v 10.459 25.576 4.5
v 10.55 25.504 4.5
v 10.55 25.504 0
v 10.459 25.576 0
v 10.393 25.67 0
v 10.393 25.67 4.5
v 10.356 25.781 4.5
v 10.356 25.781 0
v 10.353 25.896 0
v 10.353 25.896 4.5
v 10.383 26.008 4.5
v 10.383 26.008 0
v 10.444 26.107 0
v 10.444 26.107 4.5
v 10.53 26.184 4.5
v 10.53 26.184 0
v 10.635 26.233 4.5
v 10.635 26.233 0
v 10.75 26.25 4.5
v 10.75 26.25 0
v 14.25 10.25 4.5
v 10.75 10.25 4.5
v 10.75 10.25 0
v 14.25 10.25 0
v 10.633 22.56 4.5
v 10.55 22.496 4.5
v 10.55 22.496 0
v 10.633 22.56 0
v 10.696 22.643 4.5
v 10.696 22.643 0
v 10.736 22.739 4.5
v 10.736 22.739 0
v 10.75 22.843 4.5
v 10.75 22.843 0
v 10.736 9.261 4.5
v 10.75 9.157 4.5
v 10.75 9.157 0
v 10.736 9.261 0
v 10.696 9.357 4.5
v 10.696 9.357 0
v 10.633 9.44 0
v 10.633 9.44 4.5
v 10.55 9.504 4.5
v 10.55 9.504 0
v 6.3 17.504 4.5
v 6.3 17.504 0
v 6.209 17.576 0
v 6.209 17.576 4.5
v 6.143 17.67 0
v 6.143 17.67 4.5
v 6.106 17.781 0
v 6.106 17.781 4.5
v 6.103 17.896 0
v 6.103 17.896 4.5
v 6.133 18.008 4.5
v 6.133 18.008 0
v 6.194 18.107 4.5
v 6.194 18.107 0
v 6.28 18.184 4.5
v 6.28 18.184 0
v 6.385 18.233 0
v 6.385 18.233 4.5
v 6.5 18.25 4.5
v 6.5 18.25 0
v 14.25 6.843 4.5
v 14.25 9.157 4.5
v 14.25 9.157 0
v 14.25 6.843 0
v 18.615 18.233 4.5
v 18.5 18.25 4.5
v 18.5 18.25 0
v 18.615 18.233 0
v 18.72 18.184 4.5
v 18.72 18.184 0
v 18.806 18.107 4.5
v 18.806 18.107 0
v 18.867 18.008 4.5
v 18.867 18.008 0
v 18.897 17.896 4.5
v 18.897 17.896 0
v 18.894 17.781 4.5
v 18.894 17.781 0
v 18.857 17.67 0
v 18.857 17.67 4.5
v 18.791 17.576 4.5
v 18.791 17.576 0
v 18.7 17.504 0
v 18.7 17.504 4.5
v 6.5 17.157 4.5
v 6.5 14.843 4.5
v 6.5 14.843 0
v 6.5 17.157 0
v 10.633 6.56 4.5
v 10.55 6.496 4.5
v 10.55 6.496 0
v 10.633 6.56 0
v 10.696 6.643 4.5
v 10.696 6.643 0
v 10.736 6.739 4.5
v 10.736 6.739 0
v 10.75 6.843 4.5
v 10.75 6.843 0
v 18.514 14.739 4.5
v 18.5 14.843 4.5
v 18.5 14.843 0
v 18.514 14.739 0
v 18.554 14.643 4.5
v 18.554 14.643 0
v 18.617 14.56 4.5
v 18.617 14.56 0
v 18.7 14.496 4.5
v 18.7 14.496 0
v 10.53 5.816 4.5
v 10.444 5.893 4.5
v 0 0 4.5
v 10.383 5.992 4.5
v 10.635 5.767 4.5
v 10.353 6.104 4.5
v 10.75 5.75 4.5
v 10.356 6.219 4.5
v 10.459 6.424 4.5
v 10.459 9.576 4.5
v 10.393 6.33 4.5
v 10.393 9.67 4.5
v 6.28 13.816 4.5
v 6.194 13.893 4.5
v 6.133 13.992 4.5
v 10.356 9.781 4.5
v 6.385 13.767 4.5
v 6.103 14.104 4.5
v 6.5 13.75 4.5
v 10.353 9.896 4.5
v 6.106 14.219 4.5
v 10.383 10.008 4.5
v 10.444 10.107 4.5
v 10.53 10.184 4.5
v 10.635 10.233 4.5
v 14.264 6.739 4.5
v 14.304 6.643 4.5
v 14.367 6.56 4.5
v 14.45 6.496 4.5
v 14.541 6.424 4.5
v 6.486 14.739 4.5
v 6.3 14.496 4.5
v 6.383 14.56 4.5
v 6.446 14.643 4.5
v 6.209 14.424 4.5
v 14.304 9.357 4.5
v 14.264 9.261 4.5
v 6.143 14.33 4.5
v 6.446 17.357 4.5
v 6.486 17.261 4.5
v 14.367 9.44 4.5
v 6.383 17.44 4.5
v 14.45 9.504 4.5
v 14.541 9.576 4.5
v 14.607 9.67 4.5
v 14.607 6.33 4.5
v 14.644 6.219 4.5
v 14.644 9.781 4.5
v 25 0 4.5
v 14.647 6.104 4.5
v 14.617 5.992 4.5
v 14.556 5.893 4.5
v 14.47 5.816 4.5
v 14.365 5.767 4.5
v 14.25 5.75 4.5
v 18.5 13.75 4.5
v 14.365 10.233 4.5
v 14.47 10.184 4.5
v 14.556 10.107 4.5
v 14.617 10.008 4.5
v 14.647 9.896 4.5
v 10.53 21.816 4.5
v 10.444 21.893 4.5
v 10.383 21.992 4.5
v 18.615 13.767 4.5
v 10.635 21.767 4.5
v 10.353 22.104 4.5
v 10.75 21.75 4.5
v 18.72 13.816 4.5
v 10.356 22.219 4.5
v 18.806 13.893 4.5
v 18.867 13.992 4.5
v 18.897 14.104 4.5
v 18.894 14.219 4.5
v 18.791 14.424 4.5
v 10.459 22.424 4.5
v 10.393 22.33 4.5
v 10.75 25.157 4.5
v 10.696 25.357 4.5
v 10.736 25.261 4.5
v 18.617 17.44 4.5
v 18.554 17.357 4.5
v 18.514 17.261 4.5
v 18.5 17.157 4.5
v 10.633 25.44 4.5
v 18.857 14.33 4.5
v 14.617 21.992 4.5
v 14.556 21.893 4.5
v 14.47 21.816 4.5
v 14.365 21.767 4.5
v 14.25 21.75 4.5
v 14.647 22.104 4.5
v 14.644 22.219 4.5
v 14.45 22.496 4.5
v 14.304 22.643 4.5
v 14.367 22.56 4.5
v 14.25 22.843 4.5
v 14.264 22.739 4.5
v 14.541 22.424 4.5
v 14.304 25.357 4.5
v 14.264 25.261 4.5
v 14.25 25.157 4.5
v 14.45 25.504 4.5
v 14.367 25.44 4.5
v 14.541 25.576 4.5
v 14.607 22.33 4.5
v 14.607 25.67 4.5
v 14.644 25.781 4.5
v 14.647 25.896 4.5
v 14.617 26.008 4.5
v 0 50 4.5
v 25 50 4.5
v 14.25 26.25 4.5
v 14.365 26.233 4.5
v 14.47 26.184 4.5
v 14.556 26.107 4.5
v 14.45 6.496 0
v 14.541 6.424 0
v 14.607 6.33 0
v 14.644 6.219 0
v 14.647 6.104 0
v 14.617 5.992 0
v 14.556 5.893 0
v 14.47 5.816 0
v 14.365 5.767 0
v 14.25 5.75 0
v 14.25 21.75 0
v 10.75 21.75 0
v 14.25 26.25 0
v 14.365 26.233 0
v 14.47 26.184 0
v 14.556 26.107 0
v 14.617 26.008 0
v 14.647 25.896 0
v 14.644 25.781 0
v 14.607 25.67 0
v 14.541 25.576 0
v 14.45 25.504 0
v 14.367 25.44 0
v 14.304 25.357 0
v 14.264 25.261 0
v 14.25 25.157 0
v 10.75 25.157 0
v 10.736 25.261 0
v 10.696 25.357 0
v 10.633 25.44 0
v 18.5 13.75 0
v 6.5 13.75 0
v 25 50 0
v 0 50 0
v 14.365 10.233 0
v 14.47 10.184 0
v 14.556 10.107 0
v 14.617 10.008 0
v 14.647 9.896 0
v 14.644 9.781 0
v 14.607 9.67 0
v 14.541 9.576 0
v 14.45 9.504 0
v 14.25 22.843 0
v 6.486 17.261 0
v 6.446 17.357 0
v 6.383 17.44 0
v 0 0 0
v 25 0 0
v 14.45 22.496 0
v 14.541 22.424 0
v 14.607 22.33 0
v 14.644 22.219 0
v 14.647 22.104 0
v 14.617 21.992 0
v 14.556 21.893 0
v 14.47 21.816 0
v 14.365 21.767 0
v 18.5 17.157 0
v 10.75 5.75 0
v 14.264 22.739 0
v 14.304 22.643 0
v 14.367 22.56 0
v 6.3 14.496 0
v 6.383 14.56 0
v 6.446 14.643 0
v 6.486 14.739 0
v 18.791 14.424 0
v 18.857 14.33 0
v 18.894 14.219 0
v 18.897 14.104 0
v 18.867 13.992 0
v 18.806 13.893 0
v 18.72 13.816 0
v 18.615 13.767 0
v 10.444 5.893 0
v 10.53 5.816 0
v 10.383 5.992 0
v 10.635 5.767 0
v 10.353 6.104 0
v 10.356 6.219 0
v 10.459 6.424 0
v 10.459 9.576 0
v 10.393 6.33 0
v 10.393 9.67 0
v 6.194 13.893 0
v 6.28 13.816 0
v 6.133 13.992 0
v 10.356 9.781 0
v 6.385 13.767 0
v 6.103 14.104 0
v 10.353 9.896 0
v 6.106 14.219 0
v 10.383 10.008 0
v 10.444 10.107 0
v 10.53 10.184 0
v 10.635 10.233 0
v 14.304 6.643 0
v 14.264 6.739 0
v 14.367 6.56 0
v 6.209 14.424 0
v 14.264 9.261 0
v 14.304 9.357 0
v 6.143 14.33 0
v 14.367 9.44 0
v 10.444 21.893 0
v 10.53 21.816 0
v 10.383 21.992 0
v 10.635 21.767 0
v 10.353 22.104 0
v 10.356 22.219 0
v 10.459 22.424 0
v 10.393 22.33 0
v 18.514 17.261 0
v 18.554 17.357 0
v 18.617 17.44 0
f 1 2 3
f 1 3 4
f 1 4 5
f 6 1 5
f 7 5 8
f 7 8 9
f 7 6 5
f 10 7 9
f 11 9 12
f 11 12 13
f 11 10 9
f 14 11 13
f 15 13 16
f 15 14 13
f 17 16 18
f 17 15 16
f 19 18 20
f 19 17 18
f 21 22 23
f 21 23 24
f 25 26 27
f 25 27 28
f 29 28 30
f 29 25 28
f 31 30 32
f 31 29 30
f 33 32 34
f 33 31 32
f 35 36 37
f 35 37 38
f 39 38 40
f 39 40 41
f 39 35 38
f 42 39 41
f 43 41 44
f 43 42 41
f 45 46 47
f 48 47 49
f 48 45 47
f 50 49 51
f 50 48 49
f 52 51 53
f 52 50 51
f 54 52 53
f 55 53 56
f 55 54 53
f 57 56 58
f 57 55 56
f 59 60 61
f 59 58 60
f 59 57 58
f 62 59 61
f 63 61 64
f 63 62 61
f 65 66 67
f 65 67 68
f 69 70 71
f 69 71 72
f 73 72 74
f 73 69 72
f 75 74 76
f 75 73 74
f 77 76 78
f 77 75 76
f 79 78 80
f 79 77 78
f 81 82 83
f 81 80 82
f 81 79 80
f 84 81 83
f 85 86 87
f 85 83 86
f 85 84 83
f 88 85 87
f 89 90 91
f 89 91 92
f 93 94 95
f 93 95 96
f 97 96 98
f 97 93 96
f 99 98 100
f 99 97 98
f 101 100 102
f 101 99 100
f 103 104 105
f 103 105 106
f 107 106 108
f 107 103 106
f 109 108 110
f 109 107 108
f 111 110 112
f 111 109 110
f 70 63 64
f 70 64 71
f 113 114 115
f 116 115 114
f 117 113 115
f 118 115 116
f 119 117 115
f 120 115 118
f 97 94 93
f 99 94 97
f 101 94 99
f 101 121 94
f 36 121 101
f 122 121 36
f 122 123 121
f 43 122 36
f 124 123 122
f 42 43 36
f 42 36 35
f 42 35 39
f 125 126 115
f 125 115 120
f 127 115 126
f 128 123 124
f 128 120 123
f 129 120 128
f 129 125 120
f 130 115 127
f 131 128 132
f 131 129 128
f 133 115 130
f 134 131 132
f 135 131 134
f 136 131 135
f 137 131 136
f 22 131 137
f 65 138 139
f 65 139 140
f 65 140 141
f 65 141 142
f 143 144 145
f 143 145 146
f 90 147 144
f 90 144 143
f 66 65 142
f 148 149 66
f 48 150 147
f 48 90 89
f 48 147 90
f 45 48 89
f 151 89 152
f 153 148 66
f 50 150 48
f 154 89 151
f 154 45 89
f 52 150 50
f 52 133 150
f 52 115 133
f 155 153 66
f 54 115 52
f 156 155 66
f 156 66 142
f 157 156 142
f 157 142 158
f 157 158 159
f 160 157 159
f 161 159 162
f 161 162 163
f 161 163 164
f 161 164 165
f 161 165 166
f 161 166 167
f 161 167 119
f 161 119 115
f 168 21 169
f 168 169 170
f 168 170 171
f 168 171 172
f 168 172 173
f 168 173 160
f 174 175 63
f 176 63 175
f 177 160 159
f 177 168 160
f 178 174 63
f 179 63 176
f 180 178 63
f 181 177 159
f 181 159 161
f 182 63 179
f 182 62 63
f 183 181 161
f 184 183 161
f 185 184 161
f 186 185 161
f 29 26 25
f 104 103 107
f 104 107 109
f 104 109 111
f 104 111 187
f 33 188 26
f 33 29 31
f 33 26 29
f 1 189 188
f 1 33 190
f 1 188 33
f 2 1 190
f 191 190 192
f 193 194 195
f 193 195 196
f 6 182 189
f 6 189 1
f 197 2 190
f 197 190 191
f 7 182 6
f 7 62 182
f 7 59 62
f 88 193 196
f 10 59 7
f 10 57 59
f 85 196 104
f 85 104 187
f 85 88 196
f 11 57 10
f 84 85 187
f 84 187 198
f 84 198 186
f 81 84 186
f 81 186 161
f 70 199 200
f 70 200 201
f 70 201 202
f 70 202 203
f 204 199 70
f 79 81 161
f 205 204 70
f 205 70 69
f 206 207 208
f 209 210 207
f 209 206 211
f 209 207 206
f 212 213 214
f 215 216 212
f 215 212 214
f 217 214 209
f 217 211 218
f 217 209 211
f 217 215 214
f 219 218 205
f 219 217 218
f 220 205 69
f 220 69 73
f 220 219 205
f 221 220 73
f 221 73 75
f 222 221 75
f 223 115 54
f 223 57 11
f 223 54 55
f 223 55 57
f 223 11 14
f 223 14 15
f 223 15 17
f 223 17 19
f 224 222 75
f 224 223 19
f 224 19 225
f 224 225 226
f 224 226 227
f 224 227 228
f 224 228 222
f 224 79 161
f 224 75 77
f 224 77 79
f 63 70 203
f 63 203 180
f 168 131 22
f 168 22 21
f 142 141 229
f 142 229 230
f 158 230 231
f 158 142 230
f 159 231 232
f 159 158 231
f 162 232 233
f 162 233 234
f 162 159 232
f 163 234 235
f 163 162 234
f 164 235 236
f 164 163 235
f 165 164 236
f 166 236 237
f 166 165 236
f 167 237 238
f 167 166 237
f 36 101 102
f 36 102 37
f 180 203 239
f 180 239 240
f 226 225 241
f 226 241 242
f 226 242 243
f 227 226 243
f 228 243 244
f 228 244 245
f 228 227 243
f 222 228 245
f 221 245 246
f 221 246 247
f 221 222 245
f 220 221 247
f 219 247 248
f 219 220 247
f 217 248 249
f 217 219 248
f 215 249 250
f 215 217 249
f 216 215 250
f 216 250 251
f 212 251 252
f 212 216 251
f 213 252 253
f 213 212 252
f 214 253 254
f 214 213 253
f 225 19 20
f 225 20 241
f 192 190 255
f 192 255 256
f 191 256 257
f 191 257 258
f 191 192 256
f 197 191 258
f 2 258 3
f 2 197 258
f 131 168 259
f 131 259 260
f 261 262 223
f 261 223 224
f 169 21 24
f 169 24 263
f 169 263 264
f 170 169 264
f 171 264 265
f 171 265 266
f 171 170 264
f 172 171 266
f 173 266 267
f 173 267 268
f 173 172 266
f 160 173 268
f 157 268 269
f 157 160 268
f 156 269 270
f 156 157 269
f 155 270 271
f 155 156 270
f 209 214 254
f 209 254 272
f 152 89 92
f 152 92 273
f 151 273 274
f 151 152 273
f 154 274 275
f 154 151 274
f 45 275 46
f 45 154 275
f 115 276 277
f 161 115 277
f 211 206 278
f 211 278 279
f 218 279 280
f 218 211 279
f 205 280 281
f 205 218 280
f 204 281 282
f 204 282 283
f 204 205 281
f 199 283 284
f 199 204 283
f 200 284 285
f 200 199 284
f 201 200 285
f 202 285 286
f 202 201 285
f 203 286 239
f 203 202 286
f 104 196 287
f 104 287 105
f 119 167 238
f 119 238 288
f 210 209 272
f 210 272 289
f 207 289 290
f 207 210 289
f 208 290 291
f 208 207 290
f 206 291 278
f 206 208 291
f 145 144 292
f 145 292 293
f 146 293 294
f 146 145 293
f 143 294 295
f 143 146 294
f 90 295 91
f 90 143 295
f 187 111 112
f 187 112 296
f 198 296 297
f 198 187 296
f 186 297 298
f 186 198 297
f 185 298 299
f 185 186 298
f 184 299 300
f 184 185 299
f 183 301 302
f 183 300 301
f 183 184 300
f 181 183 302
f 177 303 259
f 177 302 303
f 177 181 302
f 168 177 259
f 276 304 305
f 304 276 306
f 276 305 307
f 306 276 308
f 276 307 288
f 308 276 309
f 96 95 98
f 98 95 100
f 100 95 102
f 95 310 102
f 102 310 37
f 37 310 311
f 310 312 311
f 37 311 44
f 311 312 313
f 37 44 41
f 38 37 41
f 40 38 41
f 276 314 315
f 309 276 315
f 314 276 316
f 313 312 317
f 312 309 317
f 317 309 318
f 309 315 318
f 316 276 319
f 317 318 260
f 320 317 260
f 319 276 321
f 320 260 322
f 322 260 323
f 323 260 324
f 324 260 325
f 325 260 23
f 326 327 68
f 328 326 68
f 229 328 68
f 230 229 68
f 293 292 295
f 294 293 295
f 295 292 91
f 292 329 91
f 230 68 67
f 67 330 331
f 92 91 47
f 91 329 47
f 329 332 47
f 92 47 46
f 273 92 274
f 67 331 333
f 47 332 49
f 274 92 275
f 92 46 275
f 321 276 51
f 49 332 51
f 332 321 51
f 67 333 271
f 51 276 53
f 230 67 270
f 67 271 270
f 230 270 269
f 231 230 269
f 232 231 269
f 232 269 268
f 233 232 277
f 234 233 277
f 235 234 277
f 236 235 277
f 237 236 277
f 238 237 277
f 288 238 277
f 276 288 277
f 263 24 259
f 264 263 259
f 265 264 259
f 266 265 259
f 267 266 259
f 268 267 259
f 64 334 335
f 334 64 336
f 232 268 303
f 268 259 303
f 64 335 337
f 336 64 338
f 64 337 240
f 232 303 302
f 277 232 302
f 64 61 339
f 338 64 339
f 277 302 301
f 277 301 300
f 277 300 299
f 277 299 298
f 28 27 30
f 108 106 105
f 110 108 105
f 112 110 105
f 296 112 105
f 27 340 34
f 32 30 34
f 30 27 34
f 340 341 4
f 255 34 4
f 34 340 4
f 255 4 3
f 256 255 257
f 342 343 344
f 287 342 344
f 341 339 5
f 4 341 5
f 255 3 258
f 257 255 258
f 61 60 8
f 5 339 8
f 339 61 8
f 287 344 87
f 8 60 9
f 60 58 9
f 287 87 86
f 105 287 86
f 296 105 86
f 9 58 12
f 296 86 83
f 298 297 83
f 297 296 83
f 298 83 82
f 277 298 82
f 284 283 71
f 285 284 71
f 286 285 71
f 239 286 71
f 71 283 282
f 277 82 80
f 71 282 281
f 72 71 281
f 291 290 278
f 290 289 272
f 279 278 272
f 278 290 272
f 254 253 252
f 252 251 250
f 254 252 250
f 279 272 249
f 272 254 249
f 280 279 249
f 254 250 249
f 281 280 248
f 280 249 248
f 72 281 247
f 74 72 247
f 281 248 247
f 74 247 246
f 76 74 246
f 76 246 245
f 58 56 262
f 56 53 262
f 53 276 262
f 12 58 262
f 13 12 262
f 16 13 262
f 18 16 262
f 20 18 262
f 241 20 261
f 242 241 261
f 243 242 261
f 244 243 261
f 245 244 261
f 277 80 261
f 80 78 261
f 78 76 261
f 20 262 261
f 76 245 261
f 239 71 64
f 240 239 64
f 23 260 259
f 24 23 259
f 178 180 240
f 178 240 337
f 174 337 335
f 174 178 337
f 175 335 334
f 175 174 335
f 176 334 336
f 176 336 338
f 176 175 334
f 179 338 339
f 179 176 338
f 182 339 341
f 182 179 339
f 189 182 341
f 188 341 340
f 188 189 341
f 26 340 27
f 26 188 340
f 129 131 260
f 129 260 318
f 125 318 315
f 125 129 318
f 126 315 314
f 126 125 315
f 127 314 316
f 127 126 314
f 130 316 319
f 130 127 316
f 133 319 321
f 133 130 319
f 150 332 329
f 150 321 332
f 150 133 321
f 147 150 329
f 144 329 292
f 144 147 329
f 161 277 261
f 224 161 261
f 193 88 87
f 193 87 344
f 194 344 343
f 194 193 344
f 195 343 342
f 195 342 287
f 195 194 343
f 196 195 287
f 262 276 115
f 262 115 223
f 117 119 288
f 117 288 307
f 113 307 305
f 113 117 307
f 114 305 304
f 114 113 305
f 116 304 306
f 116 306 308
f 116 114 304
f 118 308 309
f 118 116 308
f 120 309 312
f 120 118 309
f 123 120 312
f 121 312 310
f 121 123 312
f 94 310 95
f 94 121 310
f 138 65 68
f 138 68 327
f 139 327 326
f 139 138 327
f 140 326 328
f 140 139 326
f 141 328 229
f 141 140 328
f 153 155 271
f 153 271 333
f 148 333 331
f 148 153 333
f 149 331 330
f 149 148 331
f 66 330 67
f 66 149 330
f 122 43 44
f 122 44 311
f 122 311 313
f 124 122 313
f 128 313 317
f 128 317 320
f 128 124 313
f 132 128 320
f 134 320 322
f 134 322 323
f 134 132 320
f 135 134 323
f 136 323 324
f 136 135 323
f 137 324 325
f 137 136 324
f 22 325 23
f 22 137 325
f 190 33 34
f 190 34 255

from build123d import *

# Parameters (mm, degrees)
SKETCH1_W           = 25
SKETCH1_H           = 50
BOSS_EXTRUDE1_DEPTH = 4.5
CUT_EXTRUDE1_DEPTH  = 4.5
LPATTERN1_COUNT     = 2
LPATTERN1_PITCH     = 16
CUT_EXTRUDE2_REACH  = 6.5


with BuildPart() as part:
    # Sketch1 → Boss-Extrude1 (new body)
    with BuildSketch(Plane.XY):
        with Locations((12.5, 25)):
            Rectangle(SKETCH1_W, SKETCH1_H)
    extrude(amount=BOSS_EXTRUDE1_DEPTH)

    # Sketch2 → Cut-Extrude1 (cut)
    with BuildSketch(Plane.XY.offset(4.5)):
        with BuildLine():
            Line((12.5, 10.25), (14.25, 10.25))
            ThreePointArc((14.25, 10.25), (14.636370331, 9.953527618), (14.45, 9.503589838))
            ThreePointArc((14.45, 9.503589838), (14.303589838, 9.357179677), (14.25, 9.157179677))
            Line((14.25, 9.157179677), (14.25, 8))
            Line((14.25, 8), (14.25, 6.842820323))
            ThreePointArc((14.25, 6.842820323), (14.303589838, 6.642820323), (14.45, 6.496410162))
            ThreePointArc((14.45, 6.496410162), (14.636370331, 6.046472382), (14.25, 5.75))
            Line((14.25, 5.75), (12.5, 5.75))
            Line((12.5, 5.75), (10.75, 5.75))
            ThreePointArc((10.75, 5.75), (10.363629669, 6.046472382), (10.55, 6.496410162))
            ThreePointArc((10.55, 6.496410162), (10.696410162, 6.642820323), (10.75, 6.842820323))
            Line((10.75, 6.842820323), (10.75, 8))
            Line((10.75, 8), (10.75, 9.157179677))
            ThreePointArc((10.75, 9.157179677), (10.696410162, 9.357179677), (10.55, 9.503589838))
            ThreePointArc((10.55, 9.503589838), (10.363629669, 9.953527618), (10.75, 10.25))
            Line((10.75, 10.25), (12.5, 10.25))
        make_face()
    cut_extrude1 = extrude(amount=-CUT_EXTRUDE1_DEPTH, mode=Mode.SUBTRACT)

    # LPattern1: Cut-Extrude1 ×2
    with Locations(*[(0, i * LPATTERN1_PITCH, 0) for i in range(1, LPATTERN1_COUNT)]):
        add(cut_extrude1, mode=Mode.SUBTRACT)

    # Sketch3 → Cut-Extrude2 (cut, up to next)
    with BuildSketch(Plane.XY.offset(4.5), mode=Mode.PRIVATE) as cut_extrude2_sk1:
        with BuildLine():
            Line((6.5, 18.25), (18.5, 18.25))
            ThreePointArc((18.5, 18.25), (18.886370331, 17.953527618), (18.7, 17.503589838))
            ThreePointArc((18.7, 17.503589838), (18.553589838, 17.357179677), (18.5, 17.157179677))
            Line((18.5, 17.157179677), (18.5, 14.842820323))
            ThreePointArc((18.5, 14.842820323), (18.553589838, 14.642820323), (18.7, 14.496410162))
            ThreePointArc((18.7, 14.496410162), (18.886370331, 14.046472382), (18.5, 13.75))
            Line((18.5, 13.75), (6.5, 13.75))
            ThreePointArc((6.5, 13.75), (6.113629669, 14.046472382), (6.3, 14.496410162))
            ThreePointArc((6.3, 14.496410162), (6.446410162, 14.642820323), (6.5, 14.842820323))
            Line((6.5, 14.842820323), (6.5, 17.157179677))
            ThreePointArc((6.5, 17.157179677), (6.446410162, 17.357179677), (6.3, 17.503589838))
            ThreePointArc((6.3, 17.503589838), (6.113629669, 17.953527618), (6.5, 18.25))
        make_face()
    cut_extrude2_tool1 = extrude(cut_extrude2_sk1.sketch, amount=-CUT_EXTRUDE2_REACH, mode=Mode.PRIVATE) & part.part
    add(cut_extrude2_tool1.solids().sort_by_distance((12.5, 16, 4.5))[0], mode=Mode.SUBTRACT)


solid = part.part
